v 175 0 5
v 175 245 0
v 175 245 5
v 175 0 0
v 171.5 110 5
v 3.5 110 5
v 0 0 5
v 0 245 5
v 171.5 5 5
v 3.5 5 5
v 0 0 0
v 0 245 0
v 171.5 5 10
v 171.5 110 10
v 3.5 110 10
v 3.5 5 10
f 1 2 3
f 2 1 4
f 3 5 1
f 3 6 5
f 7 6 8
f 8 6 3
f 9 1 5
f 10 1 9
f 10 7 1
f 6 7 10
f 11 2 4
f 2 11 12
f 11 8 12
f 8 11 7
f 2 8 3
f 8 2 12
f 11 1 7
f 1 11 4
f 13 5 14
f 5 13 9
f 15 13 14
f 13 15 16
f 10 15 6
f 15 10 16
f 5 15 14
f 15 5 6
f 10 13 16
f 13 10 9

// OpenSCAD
//internal dimensions
caseIntX=175;
caseIntY=245;
caseBottomIntZ=65;

plateThickness=5;




switchX=168;
switchY=105;

switchPCBX=149;
switchPCBY=95;

switchXShift=(caseIntX-switchX)/2;
switchYShift=5;

//definitions for hole 2 (top right)
switch2HRadius=5;
switchH2XShiftT=2;//hole 2 shift from top
switchH2YShiftR=-5;//hole 2 shift from right

//definitions for hole 2 (bottom right)
switch4HRadius=switch2HRadius;
switchH4XShiftB=-2;//hole 2 shift from bottom
switchH4YShiftR=-5;//hole 2 shift from right

cube([caseIntX,caseIntY,plateThickness]);

translate([switchXShift,switchYShift,plateThickness])
color([0.8,0.8,0.8])
{
	cube([switchX,switchY,plateThickness]);
}
